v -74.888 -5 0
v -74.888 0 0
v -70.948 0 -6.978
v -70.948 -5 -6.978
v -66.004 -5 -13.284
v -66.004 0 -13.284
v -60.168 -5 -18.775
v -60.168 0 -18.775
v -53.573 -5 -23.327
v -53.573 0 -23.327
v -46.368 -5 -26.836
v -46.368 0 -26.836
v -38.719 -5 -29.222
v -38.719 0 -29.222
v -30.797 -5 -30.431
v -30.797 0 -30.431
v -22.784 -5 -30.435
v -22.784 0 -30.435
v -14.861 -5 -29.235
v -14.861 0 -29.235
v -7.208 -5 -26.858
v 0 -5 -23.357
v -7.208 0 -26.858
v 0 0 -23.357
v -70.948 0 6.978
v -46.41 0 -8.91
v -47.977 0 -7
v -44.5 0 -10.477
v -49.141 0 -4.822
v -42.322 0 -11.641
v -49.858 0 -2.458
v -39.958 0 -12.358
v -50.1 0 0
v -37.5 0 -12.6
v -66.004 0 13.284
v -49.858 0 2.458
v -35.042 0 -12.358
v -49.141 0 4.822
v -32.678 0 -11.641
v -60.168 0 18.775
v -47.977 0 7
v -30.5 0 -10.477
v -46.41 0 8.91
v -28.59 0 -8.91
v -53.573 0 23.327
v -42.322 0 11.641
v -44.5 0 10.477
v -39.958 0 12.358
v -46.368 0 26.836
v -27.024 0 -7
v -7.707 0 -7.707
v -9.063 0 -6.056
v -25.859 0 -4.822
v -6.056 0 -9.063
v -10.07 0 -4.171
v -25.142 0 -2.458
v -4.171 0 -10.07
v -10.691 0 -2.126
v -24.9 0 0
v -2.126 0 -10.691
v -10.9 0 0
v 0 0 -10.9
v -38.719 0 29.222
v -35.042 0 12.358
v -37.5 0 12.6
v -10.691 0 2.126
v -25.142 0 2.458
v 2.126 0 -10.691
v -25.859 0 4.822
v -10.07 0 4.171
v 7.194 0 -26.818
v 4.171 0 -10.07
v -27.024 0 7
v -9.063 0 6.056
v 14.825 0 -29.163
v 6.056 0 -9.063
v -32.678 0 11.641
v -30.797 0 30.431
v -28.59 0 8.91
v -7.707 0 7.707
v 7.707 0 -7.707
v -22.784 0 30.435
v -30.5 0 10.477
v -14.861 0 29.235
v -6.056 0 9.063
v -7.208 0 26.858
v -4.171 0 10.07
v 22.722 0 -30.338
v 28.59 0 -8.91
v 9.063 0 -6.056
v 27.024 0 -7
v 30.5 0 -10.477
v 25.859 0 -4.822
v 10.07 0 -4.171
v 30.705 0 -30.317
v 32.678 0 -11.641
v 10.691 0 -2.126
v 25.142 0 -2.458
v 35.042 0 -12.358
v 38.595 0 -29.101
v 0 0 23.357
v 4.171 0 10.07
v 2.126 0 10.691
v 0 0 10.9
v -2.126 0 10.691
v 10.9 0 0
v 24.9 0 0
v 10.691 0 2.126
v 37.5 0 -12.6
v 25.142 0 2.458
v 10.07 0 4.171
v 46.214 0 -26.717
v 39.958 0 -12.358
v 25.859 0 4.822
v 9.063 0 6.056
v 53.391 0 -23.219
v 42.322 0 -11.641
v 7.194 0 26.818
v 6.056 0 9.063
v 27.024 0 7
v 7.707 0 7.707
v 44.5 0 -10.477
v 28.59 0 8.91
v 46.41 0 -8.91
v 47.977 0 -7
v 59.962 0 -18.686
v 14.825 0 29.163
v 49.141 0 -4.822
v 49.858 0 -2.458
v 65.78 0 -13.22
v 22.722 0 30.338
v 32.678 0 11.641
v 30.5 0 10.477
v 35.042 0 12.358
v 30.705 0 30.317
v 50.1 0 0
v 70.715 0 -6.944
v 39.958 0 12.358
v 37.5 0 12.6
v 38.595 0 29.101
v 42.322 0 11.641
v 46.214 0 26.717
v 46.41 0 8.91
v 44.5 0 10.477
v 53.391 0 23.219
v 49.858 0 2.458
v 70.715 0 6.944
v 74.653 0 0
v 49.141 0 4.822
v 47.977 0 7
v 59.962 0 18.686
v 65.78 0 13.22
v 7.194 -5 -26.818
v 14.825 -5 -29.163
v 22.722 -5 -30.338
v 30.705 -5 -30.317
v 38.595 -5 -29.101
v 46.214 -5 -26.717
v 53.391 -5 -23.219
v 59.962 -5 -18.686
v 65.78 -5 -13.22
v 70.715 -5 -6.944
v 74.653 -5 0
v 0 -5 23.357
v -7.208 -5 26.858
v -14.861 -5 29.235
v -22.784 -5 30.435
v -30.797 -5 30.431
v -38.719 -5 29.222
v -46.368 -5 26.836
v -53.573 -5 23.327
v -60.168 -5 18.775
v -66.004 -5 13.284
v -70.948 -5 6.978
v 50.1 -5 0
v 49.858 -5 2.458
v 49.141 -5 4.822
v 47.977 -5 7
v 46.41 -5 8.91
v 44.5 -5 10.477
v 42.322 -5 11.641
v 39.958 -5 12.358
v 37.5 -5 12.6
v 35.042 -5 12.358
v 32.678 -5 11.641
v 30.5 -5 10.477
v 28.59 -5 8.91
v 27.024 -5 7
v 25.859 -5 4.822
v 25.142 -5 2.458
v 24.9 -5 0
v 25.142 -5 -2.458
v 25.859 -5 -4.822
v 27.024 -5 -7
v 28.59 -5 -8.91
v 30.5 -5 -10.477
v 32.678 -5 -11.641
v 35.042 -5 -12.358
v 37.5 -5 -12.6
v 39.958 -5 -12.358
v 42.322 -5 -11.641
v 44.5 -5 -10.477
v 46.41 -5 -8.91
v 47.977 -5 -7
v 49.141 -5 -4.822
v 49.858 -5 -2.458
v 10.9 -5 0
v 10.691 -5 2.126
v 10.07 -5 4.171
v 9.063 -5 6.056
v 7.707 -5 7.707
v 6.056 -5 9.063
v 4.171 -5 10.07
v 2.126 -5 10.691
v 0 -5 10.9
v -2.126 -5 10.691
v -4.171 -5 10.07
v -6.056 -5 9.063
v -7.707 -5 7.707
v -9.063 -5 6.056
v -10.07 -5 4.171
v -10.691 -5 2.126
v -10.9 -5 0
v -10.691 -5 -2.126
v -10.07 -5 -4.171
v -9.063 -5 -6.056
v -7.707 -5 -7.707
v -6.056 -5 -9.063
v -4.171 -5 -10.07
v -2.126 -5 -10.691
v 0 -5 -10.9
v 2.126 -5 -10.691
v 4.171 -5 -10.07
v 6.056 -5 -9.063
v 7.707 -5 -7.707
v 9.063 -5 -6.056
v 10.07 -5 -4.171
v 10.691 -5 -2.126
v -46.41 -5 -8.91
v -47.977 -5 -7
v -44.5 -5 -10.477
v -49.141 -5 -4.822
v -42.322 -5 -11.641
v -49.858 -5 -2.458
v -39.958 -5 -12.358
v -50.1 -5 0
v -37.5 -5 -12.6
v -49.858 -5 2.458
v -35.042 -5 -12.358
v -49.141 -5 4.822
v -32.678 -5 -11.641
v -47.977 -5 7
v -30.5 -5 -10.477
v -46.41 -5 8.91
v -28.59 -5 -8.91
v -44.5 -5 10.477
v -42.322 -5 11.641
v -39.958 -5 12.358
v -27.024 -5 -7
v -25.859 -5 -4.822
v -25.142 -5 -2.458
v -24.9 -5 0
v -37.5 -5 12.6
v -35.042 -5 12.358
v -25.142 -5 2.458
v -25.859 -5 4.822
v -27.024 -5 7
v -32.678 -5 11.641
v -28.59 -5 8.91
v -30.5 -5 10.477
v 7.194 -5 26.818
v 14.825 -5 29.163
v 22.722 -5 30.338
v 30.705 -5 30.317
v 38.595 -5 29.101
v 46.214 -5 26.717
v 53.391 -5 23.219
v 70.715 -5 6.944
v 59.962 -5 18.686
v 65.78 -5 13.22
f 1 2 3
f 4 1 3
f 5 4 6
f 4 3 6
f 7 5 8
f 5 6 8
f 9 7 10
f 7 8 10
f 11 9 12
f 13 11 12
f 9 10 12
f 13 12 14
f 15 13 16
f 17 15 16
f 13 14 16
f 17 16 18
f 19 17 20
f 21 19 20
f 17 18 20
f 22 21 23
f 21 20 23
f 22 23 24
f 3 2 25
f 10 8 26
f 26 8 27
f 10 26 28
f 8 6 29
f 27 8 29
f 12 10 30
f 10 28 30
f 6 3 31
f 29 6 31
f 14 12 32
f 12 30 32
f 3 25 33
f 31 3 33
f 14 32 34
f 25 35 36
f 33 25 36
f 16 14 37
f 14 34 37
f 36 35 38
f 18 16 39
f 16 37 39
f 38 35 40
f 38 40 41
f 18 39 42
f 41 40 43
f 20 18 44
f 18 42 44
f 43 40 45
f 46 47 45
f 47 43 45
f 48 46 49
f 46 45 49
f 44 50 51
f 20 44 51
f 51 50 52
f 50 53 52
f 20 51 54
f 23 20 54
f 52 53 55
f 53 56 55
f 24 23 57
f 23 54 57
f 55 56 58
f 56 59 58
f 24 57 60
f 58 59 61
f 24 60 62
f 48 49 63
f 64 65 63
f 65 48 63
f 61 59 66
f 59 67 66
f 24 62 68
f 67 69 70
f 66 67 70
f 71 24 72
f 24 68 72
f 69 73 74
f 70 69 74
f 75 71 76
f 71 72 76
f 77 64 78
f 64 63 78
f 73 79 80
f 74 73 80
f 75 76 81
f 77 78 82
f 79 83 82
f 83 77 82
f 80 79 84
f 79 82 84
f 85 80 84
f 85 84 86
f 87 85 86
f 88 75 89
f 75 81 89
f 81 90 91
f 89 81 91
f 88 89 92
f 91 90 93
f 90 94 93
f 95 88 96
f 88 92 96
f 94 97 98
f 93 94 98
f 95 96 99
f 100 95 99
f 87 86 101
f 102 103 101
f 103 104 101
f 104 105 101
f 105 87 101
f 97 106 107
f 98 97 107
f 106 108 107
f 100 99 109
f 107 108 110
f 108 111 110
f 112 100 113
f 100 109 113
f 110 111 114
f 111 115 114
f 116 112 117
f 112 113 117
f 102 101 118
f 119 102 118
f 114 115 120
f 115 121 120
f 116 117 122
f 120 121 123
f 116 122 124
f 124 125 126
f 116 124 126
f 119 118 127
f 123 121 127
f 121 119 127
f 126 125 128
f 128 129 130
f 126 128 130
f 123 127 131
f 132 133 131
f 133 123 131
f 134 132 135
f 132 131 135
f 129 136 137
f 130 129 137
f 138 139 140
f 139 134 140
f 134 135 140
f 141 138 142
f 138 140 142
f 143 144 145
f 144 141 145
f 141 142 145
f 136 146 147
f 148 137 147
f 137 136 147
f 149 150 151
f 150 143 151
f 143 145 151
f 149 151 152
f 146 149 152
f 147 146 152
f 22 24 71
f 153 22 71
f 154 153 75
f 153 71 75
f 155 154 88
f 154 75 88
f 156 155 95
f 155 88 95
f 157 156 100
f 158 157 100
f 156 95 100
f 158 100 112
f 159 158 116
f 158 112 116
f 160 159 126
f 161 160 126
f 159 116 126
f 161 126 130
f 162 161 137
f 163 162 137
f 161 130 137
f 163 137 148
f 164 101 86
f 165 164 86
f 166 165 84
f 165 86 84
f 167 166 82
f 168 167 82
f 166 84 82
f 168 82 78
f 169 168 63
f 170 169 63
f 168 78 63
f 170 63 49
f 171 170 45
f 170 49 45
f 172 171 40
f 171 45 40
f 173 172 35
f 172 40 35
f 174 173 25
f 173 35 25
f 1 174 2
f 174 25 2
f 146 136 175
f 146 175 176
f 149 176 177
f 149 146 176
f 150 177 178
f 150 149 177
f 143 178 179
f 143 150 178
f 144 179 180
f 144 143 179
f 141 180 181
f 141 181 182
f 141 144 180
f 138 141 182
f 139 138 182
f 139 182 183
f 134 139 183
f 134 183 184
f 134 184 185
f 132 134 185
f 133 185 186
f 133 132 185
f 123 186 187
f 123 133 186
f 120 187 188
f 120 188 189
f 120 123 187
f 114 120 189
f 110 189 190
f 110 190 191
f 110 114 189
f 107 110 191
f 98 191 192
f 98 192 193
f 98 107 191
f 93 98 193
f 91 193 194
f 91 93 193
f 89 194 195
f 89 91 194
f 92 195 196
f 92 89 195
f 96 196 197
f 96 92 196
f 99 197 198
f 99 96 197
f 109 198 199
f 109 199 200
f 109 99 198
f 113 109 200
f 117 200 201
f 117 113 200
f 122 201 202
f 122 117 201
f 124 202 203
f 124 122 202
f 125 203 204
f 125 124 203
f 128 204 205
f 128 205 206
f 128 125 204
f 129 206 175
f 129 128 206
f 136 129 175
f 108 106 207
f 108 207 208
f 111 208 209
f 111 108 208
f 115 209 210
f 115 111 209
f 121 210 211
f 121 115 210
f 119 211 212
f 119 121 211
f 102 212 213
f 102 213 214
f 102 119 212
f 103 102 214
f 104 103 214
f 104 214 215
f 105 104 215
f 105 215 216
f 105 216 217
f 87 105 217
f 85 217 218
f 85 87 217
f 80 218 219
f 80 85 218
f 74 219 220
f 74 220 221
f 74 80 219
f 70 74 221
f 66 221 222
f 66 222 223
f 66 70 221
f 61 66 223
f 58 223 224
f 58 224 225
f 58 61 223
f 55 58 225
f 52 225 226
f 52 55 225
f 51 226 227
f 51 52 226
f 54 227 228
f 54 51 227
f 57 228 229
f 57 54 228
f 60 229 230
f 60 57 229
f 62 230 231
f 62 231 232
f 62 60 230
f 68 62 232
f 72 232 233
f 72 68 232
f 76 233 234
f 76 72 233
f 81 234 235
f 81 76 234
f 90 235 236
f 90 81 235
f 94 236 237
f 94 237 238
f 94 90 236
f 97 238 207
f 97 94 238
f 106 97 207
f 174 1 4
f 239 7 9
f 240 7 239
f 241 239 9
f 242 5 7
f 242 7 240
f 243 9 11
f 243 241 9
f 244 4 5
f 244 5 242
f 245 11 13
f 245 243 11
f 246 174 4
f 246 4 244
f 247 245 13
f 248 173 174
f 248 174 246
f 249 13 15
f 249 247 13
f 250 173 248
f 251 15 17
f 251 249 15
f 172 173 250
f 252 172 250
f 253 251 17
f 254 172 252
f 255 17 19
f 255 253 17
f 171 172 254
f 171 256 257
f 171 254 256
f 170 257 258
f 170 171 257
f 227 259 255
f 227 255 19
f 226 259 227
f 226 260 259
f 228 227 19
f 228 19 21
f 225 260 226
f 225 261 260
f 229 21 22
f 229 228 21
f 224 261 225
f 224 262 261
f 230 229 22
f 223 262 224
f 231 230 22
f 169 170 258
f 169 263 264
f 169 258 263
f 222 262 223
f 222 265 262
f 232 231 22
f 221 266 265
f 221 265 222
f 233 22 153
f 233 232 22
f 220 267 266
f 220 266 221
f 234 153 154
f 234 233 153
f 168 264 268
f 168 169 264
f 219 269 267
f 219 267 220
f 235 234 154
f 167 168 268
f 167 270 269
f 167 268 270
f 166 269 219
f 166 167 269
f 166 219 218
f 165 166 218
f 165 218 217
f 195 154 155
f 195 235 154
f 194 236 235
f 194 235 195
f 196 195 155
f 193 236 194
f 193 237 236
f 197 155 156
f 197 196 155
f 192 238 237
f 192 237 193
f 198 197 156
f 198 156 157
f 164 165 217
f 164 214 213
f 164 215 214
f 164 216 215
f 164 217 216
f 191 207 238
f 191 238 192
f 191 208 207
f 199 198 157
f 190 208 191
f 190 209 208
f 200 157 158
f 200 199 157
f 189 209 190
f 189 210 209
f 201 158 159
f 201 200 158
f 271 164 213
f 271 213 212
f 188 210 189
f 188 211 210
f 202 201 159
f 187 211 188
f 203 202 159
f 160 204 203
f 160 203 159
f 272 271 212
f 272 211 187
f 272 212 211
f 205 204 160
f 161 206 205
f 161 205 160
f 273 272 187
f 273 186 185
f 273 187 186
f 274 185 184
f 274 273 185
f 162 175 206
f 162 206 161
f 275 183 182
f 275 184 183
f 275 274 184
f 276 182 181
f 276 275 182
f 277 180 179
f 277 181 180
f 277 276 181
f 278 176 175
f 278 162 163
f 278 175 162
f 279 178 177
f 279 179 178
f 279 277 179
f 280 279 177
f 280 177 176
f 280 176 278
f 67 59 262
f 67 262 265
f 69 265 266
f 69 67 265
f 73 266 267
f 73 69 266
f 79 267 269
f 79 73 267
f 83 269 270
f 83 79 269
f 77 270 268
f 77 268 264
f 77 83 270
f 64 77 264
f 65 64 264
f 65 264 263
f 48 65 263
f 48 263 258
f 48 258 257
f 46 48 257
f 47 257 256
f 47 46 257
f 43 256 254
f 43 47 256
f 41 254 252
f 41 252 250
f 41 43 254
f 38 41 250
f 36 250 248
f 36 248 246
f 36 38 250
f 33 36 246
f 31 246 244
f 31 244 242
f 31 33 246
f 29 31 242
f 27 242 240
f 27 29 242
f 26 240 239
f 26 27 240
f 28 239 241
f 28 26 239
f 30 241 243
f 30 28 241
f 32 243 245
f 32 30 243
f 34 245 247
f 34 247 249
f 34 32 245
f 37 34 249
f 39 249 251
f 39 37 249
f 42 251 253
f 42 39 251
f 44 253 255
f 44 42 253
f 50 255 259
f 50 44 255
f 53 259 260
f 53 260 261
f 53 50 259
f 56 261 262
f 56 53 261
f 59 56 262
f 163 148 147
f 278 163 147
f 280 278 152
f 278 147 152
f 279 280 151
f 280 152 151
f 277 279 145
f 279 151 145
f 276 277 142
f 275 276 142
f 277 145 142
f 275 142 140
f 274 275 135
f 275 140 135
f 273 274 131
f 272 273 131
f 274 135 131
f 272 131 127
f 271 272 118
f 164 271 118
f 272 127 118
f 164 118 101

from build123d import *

# Parameters (mm, degrees)
F0_R     = 12.6
F0_R_2   = 10.9
F1_DEPTH = 5


# Not quite as in the source:
# - a feature names something its author has since deleted; it is built from what else it names


with BuildPart() as f1:
    # F0 (on Front) → F1 (new body)
    with BuildSketch(Plane.XZ):
        with BuildLine():
            ThreePointArc((74.653416872, 0), (42.4496947935, 28.0524969579), (0, 23.3572106808))
            ThreePointArc((0, 23.3572106808), (-42.5884817576, 28.1732918571), (-74.8876929283, 0))
            ThreePointArc((-74.8876929283, 0), (-42.5885090722, -28.1733794331), (0, -23.3572106808))
            ThreePointArc((0, -23.3572106808), (42.4496947935, -28.0524969579), (74.653416872, 0))
        make_face()
        with Locations((-37.5000350177, 0)):
            Circle(F0_R, mode=Mode.SUBTRACT)
        Circle(F0_R_2, mode=Mode.SUBTRACT)
        with Locations((37.5000350177, 0)):
            Circle(F0_R, mode=Mode.SUBTRACT)
    extrude(amount=F1_DEPTH)


solid = f1.part
